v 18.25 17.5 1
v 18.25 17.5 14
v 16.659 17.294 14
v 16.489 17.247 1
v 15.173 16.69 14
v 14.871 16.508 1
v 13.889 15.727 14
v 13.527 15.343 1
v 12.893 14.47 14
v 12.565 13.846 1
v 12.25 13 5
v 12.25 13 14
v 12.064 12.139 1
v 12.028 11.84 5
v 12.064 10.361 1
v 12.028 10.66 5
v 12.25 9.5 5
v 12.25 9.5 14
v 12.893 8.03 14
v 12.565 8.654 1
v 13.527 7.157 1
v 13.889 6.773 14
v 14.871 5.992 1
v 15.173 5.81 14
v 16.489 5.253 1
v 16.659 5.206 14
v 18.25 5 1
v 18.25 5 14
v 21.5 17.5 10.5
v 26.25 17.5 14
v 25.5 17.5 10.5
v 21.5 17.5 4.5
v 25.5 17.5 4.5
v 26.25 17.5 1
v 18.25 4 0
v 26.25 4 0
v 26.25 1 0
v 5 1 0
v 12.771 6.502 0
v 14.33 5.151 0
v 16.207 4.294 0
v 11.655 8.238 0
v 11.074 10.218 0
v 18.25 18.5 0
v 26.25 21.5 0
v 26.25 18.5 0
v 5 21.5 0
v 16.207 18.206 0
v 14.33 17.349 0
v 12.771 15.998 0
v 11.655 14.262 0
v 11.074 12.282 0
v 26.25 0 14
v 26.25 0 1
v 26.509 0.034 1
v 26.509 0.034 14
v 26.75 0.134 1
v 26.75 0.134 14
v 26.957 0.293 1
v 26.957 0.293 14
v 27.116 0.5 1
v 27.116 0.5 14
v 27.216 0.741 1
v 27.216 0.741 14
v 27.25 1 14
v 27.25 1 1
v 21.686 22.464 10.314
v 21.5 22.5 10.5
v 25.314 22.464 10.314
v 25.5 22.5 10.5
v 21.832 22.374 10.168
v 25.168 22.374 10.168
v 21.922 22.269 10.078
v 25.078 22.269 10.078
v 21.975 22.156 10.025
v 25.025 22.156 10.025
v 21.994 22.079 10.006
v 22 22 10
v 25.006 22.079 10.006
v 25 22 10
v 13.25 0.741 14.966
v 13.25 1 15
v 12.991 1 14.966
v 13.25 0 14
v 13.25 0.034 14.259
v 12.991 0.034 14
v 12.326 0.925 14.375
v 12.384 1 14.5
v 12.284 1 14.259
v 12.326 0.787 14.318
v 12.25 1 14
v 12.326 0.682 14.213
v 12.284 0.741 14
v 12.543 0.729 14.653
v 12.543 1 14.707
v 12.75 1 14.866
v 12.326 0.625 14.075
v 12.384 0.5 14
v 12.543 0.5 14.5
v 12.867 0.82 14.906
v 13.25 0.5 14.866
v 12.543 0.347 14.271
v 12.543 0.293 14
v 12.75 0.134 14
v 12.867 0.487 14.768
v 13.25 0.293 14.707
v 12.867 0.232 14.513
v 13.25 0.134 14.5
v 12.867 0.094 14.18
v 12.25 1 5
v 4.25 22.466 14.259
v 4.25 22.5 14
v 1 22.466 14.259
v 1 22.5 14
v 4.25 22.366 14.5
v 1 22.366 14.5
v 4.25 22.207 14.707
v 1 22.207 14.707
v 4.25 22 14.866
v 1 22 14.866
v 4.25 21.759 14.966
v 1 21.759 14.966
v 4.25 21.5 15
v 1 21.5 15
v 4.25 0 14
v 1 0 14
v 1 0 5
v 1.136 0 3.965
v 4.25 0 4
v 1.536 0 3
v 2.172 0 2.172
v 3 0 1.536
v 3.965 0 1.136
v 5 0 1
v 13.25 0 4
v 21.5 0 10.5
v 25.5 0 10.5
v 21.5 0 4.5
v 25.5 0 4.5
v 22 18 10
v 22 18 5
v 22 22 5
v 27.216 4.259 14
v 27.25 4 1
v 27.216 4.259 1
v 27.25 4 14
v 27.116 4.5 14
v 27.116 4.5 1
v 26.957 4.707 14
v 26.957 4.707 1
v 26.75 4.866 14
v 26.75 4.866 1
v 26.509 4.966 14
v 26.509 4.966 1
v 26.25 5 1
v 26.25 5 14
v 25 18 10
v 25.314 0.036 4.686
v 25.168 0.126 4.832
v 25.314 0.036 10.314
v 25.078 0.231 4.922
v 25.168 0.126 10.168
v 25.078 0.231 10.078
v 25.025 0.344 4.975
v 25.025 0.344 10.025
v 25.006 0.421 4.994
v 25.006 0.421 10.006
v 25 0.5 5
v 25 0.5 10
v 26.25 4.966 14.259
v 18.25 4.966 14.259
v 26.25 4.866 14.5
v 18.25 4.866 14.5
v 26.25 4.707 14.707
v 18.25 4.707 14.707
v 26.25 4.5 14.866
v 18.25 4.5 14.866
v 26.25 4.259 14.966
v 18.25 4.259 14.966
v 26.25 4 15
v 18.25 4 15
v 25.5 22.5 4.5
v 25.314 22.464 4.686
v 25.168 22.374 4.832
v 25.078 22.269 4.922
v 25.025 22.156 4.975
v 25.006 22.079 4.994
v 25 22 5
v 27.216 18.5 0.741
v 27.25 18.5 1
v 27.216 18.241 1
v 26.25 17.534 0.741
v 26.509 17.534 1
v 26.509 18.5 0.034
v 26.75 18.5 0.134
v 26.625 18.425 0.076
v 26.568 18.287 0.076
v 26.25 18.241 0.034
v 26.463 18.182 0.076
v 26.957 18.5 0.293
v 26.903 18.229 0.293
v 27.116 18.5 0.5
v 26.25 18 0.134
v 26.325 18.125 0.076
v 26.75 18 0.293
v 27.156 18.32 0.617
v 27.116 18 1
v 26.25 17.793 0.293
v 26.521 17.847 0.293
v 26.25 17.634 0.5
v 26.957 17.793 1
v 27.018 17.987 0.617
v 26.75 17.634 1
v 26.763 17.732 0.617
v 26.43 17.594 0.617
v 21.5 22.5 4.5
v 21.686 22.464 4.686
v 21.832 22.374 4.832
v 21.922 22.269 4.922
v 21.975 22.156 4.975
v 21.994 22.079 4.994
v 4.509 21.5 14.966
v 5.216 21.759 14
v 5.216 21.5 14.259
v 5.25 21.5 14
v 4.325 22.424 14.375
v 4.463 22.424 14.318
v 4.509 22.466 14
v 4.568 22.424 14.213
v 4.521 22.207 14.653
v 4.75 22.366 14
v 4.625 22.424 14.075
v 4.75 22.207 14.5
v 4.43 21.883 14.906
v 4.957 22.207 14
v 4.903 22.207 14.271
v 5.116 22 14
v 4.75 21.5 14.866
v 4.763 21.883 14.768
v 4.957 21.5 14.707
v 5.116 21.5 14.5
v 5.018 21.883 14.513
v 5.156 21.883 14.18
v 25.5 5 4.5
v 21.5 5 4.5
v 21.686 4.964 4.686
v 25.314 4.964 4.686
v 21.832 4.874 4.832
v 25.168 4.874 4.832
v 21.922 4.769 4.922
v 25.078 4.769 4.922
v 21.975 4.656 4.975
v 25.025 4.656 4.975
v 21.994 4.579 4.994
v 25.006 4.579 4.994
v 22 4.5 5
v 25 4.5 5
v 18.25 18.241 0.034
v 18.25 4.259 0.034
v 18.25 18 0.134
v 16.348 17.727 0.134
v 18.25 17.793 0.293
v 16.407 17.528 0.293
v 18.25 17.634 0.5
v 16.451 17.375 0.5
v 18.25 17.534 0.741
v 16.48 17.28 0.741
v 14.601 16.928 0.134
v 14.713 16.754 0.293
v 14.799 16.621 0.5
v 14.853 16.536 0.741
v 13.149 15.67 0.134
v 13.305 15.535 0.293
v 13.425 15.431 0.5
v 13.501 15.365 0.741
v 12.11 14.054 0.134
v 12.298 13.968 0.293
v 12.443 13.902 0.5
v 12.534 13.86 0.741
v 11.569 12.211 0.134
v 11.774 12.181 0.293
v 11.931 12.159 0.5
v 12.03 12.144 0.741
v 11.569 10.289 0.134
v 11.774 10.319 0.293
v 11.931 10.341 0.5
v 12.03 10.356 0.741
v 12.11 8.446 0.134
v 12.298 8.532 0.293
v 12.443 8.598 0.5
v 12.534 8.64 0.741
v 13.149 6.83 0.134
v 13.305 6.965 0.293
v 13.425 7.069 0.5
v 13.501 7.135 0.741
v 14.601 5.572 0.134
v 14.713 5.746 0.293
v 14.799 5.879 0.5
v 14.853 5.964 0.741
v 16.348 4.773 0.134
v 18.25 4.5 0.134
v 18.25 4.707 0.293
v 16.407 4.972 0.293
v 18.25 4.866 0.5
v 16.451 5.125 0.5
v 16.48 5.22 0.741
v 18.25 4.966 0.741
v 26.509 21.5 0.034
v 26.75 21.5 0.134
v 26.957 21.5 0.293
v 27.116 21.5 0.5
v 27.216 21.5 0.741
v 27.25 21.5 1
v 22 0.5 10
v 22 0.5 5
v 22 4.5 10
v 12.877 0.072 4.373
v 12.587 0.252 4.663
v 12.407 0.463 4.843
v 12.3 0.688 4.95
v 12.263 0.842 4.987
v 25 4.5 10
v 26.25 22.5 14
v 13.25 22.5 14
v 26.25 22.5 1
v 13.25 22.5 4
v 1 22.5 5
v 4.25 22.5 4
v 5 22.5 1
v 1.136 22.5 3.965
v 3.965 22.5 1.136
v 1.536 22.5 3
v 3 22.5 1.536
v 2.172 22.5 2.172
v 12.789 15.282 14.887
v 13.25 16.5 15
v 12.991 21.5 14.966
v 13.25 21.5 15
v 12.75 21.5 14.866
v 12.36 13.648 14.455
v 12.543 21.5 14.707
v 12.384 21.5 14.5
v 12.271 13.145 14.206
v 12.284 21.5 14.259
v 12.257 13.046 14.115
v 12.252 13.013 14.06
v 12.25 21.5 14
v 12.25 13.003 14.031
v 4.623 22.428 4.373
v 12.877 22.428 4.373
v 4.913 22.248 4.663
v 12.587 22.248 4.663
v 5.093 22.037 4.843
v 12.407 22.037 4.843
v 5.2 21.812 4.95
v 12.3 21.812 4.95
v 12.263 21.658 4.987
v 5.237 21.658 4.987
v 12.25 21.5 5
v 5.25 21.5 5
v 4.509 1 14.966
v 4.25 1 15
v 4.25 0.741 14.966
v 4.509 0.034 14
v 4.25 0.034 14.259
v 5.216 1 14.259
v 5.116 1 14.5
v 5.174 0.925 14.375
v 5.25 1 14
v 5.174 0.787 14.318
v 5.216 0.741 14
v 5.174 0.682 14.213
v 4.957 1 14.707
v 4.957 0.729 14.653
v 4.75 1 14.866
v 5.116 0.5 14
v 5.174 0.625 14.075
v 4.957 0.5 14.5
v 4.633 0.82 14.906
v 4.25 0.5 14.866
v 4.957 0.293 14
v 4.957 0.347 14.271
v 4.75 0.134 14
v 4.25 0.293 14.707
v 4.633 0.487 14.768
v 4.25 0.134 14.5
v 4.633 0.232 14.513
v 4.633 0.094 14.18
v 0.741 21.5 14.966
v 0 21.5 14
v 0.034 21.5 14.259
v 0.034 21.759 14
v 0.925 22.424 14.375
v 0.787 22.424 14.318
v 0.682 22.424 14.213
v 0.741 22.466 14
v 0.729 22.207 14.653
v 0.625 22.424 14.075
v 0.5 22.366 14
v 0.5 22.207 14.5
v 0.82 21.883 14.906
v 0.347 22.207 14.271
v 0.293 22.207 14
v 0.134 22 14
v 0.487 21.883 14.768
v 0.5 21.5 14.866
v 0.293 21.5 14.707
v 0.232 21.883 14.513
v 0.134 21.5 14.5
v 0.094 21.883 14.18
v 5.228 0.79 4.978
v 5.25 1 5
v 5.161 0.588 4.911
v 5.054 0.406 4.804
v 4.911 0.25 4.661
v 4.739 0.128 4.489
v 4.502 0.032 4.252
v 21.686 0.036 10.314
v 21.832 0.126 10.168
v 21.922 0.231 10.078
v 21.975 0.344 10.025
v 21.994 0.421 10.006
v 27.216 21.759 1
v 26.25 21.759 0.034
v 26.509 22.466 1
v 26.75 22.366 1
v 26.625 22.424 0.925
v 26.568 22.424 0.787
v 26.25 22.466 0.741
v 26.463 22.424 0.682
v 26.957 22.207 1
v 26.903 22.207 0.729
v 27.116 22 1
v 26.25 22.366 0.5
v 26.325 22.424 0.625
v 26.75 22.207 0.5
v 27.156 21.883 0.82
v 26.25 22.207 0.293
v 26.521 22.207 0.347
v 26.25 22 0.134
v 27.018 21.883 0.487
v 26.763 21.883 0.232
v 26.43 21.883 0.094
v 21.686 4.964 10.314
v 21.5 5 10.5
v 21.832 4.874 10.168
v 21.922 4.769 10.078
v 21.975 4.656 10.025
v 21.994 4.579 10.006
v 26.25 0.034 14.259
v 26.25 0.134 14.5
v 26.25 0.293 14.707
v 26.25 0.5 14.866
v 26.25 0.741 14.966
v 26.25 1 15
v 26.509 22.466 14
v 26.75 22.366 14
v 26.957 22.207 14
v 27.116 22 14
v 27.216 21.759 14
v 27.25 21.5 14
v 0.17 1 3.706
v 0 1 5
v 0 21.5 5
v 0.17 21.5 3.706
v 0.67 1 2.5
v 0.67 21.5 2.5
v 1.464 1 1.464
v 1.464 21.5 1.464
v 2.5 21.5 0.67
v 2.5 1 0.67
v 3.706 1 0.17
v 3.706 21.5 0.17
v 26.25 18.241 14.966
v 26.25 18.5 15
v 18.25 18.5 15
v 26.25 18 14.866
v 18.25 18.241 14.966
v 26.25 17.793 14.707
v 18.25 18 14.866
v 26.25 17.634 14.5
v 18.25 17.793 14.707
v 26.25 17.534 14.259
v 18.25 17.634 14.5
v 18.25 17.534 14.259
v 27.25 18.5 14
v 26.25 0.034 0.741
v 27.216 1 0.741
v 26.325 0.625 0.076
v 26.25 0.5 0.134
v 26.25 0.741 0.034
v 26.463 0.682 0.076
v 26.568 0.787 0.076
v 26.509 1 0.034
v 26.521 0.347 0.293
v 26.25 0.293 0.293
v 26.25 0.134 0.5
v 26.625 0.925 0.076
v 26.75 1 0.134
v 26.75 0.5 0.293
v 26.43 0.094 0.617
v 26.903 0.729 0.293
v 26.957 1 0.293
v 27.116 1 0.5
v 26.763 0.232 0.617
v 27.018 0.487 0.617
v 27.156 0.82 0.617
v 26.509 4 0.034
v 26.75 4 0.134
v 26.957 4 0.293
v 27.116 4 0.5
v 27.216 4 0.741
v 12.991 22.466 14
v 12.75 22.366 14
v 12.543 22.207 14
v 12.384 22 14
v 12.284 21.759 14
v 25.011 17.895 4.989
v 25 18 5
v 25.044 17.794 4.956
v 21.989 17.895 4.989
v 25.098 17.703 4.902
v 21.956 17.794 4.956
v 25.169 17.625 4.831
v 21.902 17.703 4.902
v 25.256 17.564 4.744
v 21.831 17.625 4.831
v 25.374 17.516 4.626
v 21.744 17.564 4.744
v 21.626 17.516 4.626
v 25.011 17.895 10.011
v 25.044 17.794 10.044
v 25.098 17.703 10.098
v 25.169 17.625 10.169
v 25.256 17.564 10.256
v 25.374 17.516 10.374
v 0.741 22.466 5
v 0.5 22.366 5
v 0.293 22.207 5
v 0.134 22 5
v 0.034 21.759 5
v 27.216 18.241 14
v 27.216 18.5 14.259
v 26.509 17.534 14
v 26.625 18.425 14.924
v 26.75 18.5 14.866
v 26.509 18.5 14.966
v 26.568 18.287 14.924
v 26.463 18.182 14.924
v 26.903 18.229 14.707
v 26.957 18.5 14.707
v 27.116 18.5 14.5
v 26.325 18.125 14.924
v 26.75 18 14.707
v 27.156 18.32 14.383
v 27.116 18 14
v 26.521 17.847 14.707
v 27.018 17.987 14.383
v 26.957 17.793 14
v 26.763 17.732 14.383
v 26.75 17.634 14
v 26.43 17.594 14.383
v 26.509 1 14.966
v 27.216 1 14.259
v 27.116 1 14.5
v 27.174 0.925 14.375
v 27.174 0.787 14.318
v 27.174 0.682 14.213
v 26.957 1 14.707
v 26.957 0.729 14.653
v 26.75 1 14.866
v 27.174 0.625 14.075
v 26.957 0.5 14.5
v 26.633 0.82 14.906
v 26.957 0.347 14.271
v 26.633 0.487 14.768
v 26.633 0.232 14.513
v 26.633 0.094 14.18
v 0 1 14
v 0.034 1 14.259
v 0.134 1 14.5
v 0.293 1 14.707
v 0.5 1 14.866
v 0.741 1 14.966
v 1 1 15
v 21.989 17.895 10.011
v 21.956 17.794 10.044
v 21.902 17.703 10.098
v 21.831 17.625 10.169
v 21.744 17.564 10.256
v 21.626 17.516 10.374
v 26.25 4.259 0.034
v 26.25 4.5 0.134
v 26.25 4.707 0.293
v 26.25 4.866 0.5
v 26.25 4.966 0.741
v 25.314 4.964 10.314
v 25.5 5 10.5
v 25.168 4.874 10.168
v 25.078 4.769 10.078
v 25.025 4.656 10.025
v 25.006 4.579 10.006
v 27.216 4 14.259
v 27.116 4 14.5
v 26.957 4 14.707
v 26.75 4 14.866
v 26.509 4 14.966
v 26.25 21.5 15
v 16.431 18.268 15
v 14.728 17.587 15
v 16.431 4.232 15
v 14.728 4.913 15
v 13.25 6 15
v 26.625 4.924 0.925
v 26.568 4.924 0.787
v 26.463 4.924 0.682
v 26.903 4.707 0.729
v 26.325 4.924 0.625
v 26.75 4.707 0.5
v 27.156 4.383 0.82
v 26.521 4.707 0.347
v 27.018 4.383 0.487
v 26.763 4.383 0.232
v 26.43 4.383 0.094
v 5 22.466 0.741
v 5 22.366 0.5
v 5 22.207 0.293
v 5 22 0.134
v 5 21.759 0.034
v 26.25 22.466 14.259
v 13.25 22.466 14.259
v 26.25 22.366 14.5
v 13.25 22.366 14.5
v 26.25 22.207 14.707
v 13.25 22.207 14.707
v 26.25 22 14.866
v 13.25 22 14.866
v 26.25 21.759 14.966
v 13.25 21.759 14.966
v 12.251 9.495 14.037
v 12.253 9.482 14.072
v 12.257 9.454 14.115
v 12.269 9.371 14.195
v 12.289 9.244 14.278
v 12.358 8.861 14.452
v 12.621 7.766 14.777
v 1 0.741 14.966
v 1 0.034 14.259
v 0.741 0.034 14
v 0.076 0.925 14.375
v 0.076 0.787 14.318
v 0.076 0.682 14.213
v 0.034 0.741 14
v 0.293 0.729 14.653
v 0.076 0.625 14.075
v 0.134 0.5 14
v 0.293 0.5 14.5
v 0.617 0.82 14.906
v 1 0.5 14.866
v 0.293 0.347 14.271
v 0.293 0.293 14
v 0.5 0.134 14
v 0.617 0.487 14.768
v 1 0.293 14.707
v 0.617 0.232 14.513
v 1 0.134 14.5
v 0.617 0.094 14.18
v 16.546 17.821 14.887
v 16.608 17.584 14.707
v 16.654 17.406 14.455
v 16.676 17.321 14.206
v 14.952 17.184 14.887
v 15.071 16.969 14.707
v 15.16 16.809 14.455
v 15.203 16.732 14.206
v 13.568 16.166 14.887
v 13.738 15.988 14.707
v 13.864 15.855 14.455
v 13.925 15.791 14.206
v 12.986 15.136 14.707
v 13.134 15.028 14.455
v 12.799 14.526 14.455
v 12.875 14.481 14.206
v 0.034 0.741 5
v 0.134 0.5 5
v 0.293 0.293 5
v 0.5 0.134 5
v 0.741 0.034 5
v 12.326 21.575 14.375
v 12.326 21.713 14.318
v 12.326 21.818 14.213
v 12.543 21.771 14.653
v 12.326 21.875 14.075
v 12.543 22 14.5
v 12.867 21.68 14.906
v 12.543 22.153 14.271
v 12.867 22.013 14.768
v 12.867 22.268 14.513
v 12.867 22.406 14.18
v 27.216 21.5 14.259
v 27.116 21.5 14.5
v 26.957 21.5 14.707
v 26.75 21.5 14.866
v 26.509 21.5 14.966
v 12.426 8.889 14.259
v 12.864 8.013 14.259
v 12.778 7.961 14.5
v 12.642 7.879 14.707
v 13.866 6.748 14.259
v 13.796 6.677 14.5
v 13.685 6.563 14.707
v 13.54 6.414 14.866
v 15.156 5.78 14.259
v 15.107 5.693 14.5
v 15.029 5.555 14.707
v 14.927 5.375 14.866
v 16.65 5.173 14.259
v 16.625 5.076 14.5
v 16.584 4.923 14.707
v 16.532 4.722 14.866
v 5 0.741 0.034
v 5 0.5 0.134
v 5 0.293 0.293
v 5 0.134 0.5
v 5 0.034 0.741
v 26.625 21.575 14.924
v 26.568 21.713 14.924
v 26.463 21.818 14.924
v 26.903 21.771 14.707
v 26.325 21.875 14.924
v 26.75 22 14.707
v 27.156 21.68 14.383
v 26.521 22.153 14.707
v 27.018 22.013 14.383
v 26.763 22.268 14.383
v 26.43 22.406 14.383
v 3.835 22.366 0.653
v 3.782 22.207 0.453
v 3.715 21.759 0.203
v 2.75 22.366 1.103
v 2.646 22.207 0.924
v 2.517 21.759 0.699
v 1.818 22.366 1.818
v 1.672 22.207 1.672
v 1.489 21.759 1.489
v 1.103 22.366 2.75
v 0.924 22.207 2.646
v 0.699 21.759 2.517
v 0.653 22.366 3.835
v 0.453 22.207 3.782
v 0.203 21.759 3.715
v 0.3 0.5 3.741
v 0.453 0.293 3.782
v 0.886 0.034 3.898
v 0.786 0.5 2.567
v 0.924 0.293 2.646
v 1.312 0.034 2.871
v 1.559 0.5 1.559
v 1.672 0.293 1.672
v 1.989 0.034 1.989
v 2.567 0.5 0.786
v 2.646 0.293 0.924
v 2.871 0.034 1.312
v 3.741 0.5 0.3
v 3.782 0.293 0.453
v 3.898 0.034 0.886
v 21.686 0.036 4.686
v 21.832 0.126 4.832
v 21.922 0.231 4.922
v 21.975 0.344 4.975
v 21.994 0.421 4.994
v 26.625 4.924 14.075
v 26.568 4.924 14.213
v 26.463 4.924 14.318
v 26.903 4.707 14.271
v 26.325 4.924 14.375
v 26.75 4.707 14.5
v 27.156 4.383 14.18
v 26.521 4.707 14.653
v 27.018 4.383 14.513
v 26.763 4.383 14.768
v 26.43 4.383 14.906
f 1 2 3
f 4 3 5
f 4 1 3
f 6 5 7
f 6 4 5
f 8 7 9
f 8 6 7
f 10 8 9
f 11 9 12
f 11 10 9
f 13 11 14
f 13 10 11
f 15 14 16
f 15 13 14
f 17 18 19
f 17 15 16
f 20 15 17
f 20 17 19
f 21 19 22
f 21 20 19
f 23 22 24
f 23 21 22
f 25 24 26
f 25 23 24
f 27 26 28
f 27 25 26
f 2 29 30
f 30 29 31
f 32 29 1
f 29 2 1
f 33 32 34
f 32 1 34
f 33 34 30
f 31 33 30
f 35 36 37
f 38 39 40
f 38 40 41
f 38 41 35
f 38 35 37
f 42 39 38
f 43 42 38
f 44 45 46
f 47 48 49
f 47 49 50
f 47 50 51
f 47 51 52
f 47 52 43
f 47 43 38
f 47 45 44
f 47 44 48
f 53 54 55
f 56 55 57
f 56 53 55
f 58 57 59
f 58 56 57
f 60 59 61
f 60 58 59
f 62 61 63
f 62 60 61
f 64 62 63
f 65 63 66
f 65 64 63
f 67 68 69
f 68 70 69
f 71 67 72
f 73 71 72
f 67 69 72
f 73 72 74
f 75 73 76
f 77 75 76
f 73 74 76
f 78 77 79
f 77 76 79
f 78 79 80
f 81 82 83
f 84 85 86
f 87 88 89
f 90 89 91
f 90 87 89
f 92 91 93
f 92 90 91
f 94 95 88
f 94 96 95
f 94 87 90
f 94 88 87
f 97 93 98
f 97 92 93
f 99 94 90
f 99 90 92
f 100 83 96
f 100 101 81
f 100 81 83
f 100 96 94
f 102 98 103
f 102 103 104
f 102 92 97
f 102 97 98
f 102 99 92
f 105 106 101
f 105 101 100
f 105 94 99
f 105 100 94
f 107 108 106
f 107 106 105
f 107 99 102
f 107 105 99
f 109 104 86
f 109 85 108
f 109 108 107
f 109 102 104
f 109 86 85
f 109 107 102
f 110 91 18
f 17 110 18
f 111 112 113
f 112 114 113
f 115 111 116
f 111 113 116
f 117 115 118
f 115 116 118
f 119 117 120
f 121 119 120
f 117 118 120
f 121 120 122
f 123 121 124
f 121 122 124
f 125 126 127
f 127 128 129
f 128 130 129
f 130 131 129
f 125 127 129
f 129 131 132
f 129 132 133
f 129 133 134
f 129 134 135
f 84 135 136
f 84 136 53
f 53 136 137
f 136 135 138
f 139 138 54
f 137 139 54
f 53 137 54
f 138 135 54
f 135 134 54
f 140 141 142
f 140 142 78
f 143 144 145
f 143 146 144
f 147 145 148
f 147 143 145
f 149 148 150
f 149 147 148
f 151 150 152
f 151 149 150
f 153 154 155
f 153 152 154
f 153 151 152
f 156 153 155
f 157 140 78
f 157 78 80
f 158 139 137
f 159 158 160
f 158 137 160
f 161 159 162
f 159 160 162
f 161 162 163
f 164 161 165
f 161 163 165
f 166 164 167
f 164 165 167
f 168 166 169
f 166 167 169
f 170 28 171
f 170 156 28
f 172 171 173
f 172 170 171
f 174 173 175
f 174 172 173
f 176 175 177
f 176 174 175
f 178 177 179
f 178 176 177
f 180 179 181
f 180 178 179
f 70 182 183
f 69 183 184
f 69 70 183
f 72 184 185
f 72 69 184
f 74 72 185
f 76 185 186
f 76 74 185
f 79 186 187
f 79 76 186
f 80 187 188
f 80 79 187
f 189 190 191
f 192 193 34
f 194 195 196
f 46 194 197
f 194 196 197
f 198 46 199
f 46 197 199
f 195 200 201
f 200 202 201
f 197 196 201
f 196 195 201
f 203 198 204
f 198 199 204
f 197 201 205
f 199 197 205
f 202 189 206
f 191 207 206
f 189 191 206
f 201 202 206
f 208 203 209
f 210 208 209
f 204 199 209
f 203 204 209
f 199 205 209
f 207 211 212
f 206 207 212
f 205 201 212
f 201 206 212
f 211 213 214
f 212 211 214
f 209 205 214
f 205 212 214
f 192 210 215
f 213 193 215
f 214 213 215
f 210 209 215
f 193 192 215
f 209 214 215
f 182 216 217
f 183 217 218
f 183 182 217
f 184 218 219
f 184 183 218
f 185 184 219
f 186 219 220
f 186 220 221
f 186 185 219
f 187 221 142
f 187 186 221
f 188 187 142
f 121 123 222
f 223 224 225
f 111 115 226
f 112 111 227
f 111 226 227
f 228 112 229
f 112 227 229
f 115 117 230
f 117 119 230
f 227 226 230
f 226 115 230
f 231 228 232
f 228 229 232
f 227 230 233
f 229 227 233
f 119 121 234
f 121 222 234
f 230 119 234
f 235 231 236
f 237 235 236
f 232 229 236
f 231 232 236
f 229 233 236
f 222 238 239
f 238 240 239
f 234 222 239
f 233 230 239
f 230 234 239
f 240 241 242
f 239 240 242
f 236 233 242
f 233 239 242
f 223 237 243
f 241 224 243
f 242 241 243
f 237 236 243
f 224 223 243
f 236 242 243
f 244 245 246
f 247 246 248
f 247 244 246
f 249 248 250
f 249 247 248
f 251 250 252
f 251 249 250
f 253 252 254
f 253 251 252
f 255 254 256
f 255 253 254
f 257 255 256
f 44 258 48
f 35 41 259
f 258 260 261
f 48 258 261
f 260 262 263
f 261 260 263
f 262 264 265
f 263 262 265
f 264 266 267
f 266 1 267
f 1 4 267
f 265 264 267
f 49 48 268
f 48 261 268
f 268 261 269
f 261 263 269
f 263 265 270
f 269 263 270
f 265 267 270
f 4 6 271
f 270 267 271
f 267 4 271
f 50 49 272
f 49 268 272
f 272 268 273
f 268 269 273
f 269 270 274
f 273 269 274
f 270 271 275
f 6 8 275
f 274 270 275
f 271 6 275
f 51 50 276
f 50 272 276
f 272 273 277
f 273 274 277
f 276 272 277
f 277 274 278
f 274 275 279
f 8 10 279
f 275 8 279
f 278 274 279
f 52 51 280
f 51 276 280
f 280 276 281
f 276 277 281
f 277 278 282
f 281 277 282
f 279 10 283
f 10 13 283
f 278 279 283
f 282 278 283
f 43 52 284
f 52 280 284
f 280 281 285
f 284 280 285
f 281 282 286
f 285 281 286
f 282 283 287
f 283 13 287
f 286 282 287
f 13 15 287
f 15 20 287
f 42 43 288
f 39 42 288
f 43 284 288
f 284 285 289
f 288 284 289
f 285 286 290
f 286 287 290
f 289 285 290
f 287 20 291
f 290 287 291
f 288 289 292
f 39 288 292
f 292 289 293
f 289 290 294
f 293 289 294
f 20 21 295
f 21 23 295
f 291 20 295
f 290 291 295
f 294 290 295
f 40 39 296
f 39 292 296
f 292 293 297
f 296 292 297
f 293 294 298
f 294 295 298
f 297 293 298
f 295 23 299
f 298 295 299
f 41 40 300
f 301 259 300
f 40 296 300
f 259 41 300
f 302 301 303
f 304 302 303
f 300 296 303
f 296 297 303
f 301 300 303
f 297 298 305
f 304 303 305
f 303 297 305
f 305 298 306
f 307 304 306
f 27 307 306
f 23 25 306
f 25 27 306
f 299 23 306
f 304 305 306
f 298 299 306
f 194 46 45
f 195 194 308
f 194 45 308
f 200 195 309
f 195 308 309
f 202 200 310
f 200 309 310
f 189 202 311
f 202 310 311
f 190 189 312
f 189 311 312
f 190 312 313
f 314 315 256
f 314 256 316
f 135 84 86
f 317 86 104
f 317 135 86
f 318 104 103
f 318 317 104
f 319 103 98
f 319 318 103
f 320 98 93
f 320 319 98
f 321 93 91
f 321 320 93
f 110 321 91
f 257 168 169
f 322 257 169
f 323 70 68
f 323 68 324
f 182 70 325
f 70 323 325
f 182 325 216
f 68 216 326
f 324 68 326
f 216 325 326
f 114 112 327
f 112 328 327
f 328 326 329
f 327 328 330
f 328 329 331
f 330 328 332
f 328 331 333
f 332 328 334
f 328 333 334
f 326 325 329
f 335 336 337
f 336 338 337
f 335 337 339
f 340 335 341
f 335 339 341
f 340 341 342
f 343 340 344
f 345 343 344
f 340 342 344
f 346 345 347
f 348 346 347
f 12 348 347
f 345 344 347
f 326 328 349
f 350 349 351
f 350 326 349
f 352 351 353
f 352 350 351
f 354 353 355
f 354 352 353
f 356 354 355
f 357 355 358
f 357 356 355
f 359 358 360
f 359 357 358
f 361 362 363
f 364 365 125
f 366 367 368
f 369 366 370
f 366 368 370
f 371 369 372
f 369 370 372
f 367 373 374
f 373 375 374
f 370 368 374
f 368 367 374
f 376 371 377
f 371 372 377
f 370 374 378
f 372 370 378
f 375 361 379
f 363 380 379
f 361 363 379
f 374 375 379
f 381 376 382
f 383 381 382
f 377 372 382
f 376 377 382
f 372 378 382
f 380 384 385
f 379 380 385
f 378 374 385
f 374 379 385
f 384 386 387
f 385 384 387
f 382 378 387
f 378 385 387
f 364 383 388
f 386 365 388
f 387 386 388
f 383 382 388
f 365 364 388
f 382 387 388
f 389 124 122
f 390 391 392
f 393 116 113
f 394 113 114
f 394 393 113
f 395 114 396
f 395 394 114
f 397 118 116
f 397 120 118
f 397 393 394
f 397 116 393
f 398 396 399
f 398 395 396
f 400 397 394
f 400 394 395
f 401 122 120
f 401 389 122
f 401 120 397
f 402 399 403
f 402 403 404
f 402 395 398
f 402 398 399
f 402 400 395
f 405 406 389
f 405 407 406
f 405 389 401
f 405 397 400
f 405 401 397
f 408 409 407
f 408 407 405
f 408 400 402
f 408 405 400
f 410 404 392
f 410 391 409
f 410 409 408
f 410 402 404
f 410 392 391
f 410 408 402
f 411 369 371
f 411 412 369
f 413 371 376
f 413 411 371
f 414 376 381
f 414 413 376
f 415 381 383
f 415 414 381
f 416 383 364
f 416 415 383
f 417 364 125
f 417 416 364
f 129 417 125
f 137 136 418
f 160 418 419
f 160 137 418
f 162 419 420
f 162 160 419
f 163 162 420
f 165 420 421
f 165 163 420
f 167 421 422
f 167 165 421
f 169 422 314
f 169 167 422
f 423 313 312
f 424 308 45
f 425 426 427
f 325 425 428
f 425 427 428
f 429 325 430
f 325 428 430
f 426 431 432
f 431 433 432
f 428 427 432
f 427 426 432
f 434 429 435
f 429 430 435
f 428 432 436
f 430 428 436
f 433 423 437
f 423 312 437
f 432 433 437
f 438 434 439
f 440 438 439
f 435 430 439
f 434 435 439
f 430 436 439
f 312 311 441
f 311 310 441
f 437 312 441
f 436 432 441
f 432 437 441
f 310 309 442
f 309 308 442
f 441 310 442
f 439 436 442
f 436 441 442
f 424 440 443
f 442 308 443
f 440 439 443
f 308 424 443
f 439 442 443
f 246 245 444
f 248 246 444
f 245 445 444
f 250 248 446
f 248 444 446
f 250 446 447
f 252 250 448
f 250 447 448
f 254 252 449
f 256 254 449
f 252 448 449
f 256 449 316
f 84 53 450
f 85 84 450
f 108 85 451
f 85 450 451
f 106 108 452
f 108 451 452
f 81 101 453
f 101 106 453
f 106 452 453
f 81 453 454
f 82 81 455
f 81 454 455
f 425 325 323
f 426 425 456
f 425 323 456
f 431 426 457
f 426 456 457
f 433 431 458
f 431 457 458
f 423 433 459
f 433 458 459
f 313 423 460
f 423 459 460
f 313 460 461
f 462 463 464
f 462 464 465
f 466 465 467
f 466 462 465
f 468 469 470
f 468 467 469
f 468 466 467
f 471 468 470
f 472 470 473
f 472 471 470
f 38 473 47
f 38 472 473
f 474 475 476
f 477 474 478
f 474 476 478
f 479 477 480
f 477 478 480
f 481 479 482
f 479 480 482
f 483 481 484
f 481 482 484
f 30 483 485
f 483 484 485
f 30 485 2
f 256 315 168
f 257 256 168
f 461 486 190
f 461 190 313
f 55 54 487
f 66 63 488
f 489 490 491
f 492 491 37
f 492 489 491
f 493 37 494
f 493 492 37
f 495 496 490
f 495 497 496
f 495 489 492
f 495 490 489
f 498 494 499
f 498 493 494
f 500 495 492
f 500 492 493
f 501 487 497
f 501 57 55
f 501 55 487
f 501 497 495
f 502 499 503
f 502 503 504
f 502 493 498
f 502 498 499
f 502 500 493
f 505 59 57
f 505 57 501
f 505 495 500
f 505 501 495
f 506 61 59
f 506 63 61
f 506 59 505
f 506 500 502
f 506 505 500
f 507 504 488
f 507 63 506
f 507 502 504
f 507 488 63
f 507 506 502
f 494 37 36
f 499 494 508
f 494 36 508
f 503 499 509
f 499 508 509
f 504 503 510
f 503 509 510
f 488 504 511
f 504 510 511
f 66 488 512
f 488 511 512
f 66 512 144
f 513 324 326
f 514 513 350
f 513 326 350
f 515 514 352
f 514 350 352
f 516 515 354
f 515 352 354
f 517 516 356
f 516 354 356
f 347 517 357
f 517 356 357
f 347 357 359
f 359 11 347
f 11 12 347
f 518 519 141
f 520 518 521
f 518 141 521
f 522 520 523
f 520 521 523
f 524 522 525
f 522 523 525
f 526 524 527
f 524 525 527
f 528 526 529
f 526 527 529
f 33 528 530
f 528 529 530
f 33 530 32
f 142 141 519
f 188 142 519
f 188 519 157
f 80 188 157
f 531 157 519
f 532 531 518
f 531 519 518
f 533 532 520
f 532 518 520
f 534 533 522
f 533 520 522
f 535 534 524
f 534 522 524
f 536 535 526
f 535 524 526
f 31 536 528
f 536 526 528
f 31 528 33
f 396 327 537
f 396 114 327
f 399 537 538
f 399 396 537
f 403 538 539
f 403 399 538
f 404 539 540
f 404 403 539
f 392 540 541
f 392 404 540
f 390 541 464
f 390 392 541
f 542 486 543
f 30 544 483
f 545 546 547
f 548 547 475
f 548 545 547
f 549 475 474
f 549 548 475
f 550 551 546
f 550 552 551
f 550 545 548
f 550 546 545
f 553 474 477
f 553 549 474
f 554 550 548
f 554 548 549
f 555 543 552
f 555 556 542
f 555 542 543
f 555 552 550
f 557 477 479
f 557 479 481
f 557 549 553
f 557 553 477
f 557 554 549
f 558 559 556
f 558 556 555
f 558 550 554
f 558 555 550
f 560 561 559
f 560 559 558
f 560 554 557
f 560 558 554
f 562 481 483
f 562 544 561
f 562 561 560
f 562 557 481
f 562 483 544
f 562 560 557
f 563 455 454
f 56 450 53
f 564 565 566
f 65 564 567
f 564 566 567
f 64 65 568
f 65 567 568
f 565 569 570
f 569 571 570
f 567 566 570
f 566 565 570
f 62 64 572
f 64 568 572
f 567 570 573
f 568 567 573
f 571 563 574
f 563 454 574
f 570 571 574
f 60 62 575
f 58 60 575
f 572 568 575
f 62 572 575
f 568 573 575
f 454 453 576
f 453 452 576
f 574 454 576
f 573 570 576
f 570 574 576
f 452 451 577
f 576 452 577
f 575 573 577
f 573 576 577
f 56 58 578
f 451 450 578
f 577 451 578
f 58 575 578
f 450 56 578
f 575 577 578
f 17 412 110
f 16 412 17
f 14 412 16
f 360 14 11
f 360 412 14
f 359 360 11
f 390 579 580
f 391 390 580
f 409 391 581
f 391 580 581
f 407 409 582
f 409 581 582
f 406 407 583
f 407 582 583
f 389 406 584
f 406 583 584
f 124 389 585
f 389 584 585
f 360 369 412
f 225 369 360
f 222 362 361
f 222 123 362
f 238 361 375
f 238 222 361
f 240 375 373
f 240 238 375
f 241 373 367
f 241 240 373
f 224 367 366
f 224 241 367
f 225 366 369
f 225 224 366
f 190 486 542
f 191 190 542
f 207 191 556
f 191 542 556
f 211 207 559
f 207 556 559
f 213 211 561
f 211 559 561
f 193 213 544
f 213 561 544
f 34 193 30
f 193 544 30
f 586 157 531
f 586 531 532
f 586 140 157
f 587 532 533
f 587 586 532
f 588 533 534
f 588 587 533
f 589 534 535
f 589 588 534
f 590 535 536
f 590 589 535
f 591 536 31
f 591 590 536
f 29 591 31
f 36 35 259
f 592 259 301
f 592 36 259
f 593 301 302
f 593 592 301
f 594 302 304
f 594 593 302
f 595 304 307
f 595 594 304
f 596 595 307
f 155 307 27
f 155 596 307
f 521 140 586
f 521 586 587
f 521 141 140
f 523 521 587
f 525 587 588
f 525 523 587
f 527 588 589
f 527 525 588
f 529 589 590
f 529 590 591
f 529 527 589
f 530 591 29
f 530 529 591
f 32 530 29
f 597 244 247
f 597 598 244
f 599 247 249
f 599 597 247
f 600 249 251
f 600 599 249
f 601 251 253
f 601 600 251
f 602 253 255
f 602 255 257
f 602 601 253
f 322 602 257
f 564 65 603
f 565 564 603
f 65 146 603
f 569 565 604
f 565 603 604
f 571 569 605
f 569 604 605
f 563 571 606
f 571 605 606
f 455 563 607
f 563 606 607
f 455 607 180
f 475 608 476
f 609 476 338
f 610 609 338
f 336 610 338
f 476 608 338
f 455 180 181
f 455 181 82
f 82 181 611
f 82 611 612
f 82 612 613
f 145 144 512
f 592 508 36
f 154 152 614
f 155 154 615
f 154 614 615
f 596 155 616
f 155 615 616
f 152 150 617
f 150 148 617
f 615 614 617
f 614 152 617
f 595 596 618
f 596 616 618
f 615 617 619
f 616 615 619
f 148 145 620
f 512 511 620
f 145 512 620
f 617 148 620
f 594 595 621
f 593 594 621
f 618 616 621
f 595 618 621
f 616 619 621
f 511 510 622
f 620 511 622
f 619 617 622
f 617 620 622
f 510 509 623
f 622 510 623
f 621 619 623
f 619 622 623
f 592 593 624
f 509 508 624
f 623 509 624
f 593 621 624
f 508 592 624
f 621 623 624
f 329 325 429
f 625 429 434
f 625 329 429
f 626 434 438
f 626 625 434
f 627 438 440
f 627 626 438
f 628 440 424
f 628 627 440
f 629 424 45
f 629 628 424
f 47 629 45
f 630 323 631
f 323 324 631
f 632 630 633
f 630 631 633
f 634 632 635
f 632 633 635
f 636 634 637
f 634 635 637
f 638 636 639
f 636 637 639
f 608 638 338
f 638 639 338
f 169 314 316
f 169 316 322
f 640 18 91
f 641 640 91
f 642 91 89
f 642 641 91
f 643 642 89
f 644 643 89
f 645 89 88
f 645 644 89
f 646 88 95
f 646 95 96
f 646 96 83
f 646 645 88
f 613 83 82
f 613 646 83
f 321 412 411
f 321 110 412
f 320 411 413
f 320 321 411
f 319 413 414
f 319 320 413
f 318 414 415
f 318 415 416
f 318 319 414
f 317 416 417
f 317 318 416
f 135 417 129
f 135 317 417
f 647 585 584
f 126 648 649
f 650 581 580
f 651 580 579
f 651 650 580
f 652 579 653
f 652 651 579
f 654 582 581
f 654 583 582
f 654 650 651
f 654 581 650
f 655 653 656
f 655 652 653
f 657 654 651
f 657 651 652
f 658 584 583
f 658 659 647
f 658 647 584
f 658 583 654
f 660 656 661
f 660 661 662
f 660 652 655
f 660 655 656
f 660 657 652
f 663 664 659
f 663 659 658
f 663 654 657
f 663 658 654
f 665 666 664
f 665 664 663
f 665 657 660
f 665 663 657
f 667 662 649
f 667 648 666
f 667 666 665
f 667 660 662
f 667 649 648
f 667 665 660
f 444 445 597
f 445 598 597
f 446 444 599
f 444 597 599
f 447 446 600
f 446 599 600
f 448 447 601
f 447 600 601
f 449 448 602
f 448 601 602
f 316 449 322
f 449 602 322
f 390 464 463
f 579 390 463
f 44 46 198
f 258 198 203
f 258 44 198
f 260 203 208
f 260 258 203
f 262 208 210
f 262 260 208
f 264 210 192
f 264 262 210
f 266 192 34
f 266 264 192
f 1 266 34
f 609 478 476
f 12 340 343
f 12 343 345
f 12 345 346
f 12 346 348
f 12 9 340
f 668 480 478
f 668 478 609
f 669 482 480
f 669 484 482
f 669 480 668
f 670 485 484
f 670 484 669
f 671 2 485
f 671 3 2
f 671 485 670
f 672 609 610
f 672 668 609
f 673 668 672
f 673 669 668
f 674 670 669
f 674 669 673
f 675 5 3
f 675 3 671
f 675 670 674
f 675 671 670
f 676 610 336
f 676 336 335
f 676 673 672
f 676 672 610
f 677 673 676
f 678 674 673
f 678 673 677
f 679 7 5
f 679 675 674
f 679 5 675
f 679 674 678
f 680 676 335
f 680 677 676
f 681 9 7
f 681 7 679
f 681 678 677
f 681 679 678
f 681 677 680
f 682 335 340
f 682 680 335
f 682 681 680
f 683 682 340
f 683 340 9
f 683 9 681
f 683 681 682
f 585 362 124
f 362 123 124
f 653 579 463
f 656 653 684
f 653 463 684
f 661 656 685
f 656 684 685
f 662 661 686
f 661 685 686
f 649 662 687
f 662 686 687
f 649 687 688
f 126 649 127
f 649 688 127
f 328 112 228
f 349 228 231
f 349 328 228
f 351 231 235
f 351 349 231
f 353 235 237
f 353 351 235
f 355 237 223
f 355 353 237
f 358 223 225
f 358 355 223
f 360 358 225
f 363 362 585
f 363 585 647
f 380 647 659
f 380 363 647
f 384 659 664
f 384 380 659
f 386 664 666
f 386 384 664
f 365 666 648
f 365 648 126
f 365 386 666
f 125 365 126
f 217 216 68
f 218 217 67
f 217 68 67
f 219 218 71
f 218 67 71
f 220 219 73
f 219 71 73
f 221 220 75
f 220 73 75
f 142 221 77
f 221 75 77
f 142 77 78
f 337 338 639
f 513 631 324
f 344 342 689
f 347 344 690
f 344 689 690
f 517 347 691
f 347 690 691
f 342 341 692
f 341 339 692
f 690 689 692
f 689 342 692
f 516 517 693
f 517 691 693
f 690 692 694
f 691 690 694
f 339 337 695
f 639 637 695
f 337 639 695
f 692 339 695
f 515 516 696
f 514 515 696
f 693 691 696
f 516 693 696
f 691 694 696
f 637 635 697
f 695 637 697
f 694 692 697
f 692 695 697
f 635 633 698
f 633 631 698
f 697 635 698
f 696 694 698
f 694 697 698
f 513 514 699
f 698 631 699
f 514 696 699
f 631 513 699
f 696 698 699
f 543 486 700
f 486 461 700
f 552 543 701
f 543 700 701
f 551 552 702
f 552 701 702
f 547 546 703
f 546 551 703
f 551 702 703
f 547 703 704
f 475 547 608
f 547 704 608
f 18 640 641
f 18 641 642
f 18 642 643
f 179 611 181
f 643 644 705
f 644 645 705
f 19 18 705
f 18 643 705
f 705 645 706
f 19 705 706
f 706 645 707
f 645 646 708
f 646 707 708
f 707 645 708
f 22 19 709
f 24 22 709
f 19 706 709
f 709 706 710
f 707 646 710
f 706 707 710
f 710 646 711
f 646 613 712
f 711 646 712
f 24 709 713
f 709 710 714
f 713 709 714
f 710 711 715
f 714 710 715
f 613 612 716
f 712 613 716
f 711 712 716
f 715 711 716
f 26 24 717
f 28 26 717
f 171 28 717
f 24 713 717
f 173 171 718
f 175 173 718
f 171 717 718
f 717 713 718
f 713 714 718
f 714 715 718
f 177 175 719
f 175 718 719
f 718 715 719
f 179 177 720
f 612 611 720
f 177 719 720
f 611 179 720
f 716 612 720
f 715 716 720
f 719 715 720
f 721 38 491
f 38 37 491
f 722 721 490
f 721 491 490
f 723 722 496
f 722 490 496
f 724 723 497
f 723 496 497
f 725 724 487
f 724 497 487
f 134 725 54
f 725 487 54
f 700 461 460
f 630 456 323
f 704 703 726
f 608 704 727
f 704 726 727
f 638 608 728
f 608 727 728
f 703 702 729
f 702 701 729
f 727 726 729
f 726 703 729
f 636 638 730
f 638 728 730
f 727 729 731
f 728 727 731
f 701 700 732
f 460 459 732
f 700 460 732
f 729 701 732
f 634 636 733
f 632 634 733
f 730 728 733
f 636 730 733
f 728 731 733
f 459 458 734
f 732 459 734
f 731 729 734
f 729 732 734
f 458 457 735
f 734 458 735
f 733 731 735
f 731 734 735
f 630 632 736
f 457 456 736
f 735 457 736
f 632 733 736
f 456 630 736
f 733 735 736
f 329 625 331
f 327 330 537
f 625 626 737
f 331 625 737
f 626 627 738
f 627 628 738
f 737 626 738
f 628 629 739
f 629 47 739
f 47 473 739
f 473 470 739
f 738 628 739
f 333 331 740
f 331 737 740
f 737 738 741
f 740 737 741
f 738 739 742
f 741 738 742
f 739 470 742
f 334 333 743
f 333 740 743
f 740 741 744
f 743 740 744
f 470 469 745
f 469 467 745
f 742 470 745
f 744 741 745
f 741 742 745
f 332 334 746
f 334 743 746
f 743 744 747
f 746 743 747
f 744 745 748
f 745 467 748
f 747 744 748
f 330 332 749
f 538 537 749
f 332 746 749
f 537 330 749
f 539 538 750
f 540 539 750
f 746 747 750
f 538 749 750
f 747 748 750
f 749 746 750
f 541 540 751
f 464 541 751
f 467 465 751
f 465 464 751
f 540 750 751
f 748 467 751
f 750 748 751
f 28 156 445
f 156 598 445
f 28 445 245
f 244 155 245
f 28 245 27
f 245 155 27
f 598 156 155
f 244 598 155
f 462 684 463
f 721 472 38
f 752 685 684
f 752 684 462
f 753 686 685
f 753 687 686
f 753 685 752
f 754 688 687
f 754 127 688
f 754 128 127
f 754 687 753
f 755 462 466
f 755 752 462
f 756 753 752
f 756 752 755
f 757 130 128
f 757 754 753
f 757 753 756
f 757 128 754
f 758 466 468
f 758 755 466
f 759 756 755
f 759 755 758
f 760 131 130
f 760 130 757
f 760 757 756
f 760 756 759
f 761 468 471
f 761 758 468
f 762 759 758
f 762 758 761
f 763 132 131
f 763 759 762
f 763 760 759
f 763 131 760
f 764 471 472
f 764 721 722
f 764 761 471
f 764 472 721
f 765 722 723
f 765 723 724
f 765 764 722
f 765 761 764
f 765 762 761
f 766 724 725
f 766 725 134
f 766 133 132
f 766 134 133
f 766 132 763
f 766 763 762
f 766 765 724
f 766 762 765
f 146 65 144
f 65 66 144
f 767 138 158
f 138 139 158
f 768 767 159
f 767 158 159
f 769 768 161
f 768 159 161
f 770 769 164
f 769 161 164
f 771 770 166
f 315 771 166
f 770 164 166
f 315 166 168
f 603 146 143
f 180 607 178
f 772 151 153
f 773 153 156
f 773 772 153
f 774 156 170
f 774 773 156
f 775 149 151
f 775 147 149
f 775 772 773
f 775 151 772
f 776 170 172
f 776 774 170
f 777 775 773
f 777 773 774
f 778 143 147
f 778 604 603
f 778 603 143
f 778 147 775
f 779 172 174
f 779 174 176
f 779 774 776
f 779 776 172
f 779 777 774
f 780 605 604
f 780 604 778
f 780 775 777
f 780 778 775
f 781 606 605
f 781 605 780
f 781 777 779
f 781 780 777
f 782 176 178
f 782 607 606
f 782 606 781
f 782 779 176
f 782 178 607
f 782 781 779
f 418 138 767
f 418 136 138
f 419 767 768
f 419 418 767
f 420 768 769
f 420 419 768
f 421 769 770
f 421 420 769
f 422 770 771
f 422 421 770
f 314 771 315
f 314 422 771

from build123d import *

# Parameters (mm, degrees)
PAD_DEPTH       = 15
SKETCH001_W     = 7
SKETCH001_H     = 22.5
POCKET_DEPTH    = 10
SKETCH002_W     = 3
SKETCH002_H     = 5
POCKET001_DEPTH = 15.001
FILLET_R        = 5
SKETCH003_W     = 3
SKETCH003_H     = 5
POCKET002_DEPTH = 22.501
FILLET001_R     = 1
FILLET002_R     = 0.5


with BuildPart() as part:
    # Sketch → Pad (new body)
    with BuildSketch(Plane.XY):
        with BuildLine():
            ThreePointArc((18.25, 17.5), (12, 11.25), (18.25, 5))
            Line((27.25, 5), (18.25, 5))
            Line((27.25, 0), (27.25, 5))
            Line((0, 0), (27.25, 0))
            Line((0, 22.5), (0, 0))
            Line((27.25, 22.5), (0, 22.5))
            Line((27.25, 17.5), (27.25, 22.5))
            Line((18.25, 17.5), (27.25, 17.5))
        make_face()
    extrude(amount=PAD_DEPTH)

    # Sketch001 (on Face10 of Pad) → Pocket (cut)
    with BuildSketch(Plane.XY.offset(15)):
        with Locations((8.75, 11.25)):
            Rectangle(SKETCH001_W, SKETCH001_H)
    extrude(amount=-POCKET_DEPTH, mode=Mode.SUBTRACT)

    # Sketch002 (on Face8 of Pocket) → Pocket001 (cut, through all)
    with BuildSketch(Plane.XY.offset(15)):
        with Locations((28.5, 7.5)):
            Rectangle(SKETCH002_W, SKETCH002_H)
    extrude(amount=-POCKET001_DEPTH, mode=Mode.SUBTRACT)

    # Fillet
    fillet_edges = [part.edges().sort_by_distance(p)[0] for p in [
        (0, 11.25, 0),
    ]]
    fillet(fillet_edges, radius=FILLET_R)

    # Sketch003 (on Face2 of Fillet) → Pocket002 (cut, through all)
    with BuildSketch(Plane.XZ):
        with Locations((23.5, 7.5)):
            Rectangle(SKETCH003_W, SKETCH003_H)
    extrude(amount=-POCKET002_DEPTH, mode=Mode.SUBTRACT)

    # Fillet001
    fillet001_edges = [part.edges().sort_by_distance(p)[0] for p in [
        (2.625, 0, 15),
        (0, 11.25, 15),
        (5.25, 11.25, 15),
        (2.625, 22.5, 15),
        (19.75, 0, 15),
        (27.25, 2.5, 15),
        (27.25, 0, 7.5),
        (16.125, 0, 0),
        (12.25, 4.75, 15),
        (27.25, 2.5, 0),
        (5.25, 0, 10),
        (12.25, 0, 10),
        (8.75, 0, 5),
        (27.25, 5, 7.5),
        (27.25, 17.5, 7.5),
        (27.25, 20, 0),
        (27.25, 22.5, 7.5),
        (27.25, 20, 15),
        (19.75, 22.5, 15),
        (12.25, 17.75, 15),
        (16.125, 22.5, 0),
        (12.25, 22.5, 10),
        (5.25, 22.5, 10),
        (0, 22.5, 10),
        (8.75, 22.5, 5),
        (1.464466, 22.5, 1.464466),
        (22.625, 5, 0),
        (12, 11.25, 0),
        (22.75, 17.5, 0),
        (22.625, 5, 15),
        (14.5, 6.25, 15),
        (14.5, 16.25, 15),
        (22.75, 17.5, 15),
    ]]
    fillet(fillet001_edges, radius=FILLET001_R)

    # Fillet002
    fillet002_edges = [part.edges().sort_by_distance(p)[0] for p in [
        (22, 0, 7.5),
        (23.5, 0, 10),
        (25, 0, 7.5),
        (23.5, 0, 5),
        (23.5, 17.5, 10),
        (22, 17.5, 7.5),
        (23.5, 17.5, 5),
        (25, 17.5, 7.5),
        (23.5, 5, 10),
        (22, 5, 7.5),
        (23.5, 5, 5),
        (25, 5, 7.5),
        (22, 22.5, 7.5),
        (23.5, 22.5, 10),
        (25, 22.5, 7.5),
        (23.5, 22.5, 5),
    ]]
    fillet(fillet002_edges, radius=FILLET002_R)


solid = part.part
